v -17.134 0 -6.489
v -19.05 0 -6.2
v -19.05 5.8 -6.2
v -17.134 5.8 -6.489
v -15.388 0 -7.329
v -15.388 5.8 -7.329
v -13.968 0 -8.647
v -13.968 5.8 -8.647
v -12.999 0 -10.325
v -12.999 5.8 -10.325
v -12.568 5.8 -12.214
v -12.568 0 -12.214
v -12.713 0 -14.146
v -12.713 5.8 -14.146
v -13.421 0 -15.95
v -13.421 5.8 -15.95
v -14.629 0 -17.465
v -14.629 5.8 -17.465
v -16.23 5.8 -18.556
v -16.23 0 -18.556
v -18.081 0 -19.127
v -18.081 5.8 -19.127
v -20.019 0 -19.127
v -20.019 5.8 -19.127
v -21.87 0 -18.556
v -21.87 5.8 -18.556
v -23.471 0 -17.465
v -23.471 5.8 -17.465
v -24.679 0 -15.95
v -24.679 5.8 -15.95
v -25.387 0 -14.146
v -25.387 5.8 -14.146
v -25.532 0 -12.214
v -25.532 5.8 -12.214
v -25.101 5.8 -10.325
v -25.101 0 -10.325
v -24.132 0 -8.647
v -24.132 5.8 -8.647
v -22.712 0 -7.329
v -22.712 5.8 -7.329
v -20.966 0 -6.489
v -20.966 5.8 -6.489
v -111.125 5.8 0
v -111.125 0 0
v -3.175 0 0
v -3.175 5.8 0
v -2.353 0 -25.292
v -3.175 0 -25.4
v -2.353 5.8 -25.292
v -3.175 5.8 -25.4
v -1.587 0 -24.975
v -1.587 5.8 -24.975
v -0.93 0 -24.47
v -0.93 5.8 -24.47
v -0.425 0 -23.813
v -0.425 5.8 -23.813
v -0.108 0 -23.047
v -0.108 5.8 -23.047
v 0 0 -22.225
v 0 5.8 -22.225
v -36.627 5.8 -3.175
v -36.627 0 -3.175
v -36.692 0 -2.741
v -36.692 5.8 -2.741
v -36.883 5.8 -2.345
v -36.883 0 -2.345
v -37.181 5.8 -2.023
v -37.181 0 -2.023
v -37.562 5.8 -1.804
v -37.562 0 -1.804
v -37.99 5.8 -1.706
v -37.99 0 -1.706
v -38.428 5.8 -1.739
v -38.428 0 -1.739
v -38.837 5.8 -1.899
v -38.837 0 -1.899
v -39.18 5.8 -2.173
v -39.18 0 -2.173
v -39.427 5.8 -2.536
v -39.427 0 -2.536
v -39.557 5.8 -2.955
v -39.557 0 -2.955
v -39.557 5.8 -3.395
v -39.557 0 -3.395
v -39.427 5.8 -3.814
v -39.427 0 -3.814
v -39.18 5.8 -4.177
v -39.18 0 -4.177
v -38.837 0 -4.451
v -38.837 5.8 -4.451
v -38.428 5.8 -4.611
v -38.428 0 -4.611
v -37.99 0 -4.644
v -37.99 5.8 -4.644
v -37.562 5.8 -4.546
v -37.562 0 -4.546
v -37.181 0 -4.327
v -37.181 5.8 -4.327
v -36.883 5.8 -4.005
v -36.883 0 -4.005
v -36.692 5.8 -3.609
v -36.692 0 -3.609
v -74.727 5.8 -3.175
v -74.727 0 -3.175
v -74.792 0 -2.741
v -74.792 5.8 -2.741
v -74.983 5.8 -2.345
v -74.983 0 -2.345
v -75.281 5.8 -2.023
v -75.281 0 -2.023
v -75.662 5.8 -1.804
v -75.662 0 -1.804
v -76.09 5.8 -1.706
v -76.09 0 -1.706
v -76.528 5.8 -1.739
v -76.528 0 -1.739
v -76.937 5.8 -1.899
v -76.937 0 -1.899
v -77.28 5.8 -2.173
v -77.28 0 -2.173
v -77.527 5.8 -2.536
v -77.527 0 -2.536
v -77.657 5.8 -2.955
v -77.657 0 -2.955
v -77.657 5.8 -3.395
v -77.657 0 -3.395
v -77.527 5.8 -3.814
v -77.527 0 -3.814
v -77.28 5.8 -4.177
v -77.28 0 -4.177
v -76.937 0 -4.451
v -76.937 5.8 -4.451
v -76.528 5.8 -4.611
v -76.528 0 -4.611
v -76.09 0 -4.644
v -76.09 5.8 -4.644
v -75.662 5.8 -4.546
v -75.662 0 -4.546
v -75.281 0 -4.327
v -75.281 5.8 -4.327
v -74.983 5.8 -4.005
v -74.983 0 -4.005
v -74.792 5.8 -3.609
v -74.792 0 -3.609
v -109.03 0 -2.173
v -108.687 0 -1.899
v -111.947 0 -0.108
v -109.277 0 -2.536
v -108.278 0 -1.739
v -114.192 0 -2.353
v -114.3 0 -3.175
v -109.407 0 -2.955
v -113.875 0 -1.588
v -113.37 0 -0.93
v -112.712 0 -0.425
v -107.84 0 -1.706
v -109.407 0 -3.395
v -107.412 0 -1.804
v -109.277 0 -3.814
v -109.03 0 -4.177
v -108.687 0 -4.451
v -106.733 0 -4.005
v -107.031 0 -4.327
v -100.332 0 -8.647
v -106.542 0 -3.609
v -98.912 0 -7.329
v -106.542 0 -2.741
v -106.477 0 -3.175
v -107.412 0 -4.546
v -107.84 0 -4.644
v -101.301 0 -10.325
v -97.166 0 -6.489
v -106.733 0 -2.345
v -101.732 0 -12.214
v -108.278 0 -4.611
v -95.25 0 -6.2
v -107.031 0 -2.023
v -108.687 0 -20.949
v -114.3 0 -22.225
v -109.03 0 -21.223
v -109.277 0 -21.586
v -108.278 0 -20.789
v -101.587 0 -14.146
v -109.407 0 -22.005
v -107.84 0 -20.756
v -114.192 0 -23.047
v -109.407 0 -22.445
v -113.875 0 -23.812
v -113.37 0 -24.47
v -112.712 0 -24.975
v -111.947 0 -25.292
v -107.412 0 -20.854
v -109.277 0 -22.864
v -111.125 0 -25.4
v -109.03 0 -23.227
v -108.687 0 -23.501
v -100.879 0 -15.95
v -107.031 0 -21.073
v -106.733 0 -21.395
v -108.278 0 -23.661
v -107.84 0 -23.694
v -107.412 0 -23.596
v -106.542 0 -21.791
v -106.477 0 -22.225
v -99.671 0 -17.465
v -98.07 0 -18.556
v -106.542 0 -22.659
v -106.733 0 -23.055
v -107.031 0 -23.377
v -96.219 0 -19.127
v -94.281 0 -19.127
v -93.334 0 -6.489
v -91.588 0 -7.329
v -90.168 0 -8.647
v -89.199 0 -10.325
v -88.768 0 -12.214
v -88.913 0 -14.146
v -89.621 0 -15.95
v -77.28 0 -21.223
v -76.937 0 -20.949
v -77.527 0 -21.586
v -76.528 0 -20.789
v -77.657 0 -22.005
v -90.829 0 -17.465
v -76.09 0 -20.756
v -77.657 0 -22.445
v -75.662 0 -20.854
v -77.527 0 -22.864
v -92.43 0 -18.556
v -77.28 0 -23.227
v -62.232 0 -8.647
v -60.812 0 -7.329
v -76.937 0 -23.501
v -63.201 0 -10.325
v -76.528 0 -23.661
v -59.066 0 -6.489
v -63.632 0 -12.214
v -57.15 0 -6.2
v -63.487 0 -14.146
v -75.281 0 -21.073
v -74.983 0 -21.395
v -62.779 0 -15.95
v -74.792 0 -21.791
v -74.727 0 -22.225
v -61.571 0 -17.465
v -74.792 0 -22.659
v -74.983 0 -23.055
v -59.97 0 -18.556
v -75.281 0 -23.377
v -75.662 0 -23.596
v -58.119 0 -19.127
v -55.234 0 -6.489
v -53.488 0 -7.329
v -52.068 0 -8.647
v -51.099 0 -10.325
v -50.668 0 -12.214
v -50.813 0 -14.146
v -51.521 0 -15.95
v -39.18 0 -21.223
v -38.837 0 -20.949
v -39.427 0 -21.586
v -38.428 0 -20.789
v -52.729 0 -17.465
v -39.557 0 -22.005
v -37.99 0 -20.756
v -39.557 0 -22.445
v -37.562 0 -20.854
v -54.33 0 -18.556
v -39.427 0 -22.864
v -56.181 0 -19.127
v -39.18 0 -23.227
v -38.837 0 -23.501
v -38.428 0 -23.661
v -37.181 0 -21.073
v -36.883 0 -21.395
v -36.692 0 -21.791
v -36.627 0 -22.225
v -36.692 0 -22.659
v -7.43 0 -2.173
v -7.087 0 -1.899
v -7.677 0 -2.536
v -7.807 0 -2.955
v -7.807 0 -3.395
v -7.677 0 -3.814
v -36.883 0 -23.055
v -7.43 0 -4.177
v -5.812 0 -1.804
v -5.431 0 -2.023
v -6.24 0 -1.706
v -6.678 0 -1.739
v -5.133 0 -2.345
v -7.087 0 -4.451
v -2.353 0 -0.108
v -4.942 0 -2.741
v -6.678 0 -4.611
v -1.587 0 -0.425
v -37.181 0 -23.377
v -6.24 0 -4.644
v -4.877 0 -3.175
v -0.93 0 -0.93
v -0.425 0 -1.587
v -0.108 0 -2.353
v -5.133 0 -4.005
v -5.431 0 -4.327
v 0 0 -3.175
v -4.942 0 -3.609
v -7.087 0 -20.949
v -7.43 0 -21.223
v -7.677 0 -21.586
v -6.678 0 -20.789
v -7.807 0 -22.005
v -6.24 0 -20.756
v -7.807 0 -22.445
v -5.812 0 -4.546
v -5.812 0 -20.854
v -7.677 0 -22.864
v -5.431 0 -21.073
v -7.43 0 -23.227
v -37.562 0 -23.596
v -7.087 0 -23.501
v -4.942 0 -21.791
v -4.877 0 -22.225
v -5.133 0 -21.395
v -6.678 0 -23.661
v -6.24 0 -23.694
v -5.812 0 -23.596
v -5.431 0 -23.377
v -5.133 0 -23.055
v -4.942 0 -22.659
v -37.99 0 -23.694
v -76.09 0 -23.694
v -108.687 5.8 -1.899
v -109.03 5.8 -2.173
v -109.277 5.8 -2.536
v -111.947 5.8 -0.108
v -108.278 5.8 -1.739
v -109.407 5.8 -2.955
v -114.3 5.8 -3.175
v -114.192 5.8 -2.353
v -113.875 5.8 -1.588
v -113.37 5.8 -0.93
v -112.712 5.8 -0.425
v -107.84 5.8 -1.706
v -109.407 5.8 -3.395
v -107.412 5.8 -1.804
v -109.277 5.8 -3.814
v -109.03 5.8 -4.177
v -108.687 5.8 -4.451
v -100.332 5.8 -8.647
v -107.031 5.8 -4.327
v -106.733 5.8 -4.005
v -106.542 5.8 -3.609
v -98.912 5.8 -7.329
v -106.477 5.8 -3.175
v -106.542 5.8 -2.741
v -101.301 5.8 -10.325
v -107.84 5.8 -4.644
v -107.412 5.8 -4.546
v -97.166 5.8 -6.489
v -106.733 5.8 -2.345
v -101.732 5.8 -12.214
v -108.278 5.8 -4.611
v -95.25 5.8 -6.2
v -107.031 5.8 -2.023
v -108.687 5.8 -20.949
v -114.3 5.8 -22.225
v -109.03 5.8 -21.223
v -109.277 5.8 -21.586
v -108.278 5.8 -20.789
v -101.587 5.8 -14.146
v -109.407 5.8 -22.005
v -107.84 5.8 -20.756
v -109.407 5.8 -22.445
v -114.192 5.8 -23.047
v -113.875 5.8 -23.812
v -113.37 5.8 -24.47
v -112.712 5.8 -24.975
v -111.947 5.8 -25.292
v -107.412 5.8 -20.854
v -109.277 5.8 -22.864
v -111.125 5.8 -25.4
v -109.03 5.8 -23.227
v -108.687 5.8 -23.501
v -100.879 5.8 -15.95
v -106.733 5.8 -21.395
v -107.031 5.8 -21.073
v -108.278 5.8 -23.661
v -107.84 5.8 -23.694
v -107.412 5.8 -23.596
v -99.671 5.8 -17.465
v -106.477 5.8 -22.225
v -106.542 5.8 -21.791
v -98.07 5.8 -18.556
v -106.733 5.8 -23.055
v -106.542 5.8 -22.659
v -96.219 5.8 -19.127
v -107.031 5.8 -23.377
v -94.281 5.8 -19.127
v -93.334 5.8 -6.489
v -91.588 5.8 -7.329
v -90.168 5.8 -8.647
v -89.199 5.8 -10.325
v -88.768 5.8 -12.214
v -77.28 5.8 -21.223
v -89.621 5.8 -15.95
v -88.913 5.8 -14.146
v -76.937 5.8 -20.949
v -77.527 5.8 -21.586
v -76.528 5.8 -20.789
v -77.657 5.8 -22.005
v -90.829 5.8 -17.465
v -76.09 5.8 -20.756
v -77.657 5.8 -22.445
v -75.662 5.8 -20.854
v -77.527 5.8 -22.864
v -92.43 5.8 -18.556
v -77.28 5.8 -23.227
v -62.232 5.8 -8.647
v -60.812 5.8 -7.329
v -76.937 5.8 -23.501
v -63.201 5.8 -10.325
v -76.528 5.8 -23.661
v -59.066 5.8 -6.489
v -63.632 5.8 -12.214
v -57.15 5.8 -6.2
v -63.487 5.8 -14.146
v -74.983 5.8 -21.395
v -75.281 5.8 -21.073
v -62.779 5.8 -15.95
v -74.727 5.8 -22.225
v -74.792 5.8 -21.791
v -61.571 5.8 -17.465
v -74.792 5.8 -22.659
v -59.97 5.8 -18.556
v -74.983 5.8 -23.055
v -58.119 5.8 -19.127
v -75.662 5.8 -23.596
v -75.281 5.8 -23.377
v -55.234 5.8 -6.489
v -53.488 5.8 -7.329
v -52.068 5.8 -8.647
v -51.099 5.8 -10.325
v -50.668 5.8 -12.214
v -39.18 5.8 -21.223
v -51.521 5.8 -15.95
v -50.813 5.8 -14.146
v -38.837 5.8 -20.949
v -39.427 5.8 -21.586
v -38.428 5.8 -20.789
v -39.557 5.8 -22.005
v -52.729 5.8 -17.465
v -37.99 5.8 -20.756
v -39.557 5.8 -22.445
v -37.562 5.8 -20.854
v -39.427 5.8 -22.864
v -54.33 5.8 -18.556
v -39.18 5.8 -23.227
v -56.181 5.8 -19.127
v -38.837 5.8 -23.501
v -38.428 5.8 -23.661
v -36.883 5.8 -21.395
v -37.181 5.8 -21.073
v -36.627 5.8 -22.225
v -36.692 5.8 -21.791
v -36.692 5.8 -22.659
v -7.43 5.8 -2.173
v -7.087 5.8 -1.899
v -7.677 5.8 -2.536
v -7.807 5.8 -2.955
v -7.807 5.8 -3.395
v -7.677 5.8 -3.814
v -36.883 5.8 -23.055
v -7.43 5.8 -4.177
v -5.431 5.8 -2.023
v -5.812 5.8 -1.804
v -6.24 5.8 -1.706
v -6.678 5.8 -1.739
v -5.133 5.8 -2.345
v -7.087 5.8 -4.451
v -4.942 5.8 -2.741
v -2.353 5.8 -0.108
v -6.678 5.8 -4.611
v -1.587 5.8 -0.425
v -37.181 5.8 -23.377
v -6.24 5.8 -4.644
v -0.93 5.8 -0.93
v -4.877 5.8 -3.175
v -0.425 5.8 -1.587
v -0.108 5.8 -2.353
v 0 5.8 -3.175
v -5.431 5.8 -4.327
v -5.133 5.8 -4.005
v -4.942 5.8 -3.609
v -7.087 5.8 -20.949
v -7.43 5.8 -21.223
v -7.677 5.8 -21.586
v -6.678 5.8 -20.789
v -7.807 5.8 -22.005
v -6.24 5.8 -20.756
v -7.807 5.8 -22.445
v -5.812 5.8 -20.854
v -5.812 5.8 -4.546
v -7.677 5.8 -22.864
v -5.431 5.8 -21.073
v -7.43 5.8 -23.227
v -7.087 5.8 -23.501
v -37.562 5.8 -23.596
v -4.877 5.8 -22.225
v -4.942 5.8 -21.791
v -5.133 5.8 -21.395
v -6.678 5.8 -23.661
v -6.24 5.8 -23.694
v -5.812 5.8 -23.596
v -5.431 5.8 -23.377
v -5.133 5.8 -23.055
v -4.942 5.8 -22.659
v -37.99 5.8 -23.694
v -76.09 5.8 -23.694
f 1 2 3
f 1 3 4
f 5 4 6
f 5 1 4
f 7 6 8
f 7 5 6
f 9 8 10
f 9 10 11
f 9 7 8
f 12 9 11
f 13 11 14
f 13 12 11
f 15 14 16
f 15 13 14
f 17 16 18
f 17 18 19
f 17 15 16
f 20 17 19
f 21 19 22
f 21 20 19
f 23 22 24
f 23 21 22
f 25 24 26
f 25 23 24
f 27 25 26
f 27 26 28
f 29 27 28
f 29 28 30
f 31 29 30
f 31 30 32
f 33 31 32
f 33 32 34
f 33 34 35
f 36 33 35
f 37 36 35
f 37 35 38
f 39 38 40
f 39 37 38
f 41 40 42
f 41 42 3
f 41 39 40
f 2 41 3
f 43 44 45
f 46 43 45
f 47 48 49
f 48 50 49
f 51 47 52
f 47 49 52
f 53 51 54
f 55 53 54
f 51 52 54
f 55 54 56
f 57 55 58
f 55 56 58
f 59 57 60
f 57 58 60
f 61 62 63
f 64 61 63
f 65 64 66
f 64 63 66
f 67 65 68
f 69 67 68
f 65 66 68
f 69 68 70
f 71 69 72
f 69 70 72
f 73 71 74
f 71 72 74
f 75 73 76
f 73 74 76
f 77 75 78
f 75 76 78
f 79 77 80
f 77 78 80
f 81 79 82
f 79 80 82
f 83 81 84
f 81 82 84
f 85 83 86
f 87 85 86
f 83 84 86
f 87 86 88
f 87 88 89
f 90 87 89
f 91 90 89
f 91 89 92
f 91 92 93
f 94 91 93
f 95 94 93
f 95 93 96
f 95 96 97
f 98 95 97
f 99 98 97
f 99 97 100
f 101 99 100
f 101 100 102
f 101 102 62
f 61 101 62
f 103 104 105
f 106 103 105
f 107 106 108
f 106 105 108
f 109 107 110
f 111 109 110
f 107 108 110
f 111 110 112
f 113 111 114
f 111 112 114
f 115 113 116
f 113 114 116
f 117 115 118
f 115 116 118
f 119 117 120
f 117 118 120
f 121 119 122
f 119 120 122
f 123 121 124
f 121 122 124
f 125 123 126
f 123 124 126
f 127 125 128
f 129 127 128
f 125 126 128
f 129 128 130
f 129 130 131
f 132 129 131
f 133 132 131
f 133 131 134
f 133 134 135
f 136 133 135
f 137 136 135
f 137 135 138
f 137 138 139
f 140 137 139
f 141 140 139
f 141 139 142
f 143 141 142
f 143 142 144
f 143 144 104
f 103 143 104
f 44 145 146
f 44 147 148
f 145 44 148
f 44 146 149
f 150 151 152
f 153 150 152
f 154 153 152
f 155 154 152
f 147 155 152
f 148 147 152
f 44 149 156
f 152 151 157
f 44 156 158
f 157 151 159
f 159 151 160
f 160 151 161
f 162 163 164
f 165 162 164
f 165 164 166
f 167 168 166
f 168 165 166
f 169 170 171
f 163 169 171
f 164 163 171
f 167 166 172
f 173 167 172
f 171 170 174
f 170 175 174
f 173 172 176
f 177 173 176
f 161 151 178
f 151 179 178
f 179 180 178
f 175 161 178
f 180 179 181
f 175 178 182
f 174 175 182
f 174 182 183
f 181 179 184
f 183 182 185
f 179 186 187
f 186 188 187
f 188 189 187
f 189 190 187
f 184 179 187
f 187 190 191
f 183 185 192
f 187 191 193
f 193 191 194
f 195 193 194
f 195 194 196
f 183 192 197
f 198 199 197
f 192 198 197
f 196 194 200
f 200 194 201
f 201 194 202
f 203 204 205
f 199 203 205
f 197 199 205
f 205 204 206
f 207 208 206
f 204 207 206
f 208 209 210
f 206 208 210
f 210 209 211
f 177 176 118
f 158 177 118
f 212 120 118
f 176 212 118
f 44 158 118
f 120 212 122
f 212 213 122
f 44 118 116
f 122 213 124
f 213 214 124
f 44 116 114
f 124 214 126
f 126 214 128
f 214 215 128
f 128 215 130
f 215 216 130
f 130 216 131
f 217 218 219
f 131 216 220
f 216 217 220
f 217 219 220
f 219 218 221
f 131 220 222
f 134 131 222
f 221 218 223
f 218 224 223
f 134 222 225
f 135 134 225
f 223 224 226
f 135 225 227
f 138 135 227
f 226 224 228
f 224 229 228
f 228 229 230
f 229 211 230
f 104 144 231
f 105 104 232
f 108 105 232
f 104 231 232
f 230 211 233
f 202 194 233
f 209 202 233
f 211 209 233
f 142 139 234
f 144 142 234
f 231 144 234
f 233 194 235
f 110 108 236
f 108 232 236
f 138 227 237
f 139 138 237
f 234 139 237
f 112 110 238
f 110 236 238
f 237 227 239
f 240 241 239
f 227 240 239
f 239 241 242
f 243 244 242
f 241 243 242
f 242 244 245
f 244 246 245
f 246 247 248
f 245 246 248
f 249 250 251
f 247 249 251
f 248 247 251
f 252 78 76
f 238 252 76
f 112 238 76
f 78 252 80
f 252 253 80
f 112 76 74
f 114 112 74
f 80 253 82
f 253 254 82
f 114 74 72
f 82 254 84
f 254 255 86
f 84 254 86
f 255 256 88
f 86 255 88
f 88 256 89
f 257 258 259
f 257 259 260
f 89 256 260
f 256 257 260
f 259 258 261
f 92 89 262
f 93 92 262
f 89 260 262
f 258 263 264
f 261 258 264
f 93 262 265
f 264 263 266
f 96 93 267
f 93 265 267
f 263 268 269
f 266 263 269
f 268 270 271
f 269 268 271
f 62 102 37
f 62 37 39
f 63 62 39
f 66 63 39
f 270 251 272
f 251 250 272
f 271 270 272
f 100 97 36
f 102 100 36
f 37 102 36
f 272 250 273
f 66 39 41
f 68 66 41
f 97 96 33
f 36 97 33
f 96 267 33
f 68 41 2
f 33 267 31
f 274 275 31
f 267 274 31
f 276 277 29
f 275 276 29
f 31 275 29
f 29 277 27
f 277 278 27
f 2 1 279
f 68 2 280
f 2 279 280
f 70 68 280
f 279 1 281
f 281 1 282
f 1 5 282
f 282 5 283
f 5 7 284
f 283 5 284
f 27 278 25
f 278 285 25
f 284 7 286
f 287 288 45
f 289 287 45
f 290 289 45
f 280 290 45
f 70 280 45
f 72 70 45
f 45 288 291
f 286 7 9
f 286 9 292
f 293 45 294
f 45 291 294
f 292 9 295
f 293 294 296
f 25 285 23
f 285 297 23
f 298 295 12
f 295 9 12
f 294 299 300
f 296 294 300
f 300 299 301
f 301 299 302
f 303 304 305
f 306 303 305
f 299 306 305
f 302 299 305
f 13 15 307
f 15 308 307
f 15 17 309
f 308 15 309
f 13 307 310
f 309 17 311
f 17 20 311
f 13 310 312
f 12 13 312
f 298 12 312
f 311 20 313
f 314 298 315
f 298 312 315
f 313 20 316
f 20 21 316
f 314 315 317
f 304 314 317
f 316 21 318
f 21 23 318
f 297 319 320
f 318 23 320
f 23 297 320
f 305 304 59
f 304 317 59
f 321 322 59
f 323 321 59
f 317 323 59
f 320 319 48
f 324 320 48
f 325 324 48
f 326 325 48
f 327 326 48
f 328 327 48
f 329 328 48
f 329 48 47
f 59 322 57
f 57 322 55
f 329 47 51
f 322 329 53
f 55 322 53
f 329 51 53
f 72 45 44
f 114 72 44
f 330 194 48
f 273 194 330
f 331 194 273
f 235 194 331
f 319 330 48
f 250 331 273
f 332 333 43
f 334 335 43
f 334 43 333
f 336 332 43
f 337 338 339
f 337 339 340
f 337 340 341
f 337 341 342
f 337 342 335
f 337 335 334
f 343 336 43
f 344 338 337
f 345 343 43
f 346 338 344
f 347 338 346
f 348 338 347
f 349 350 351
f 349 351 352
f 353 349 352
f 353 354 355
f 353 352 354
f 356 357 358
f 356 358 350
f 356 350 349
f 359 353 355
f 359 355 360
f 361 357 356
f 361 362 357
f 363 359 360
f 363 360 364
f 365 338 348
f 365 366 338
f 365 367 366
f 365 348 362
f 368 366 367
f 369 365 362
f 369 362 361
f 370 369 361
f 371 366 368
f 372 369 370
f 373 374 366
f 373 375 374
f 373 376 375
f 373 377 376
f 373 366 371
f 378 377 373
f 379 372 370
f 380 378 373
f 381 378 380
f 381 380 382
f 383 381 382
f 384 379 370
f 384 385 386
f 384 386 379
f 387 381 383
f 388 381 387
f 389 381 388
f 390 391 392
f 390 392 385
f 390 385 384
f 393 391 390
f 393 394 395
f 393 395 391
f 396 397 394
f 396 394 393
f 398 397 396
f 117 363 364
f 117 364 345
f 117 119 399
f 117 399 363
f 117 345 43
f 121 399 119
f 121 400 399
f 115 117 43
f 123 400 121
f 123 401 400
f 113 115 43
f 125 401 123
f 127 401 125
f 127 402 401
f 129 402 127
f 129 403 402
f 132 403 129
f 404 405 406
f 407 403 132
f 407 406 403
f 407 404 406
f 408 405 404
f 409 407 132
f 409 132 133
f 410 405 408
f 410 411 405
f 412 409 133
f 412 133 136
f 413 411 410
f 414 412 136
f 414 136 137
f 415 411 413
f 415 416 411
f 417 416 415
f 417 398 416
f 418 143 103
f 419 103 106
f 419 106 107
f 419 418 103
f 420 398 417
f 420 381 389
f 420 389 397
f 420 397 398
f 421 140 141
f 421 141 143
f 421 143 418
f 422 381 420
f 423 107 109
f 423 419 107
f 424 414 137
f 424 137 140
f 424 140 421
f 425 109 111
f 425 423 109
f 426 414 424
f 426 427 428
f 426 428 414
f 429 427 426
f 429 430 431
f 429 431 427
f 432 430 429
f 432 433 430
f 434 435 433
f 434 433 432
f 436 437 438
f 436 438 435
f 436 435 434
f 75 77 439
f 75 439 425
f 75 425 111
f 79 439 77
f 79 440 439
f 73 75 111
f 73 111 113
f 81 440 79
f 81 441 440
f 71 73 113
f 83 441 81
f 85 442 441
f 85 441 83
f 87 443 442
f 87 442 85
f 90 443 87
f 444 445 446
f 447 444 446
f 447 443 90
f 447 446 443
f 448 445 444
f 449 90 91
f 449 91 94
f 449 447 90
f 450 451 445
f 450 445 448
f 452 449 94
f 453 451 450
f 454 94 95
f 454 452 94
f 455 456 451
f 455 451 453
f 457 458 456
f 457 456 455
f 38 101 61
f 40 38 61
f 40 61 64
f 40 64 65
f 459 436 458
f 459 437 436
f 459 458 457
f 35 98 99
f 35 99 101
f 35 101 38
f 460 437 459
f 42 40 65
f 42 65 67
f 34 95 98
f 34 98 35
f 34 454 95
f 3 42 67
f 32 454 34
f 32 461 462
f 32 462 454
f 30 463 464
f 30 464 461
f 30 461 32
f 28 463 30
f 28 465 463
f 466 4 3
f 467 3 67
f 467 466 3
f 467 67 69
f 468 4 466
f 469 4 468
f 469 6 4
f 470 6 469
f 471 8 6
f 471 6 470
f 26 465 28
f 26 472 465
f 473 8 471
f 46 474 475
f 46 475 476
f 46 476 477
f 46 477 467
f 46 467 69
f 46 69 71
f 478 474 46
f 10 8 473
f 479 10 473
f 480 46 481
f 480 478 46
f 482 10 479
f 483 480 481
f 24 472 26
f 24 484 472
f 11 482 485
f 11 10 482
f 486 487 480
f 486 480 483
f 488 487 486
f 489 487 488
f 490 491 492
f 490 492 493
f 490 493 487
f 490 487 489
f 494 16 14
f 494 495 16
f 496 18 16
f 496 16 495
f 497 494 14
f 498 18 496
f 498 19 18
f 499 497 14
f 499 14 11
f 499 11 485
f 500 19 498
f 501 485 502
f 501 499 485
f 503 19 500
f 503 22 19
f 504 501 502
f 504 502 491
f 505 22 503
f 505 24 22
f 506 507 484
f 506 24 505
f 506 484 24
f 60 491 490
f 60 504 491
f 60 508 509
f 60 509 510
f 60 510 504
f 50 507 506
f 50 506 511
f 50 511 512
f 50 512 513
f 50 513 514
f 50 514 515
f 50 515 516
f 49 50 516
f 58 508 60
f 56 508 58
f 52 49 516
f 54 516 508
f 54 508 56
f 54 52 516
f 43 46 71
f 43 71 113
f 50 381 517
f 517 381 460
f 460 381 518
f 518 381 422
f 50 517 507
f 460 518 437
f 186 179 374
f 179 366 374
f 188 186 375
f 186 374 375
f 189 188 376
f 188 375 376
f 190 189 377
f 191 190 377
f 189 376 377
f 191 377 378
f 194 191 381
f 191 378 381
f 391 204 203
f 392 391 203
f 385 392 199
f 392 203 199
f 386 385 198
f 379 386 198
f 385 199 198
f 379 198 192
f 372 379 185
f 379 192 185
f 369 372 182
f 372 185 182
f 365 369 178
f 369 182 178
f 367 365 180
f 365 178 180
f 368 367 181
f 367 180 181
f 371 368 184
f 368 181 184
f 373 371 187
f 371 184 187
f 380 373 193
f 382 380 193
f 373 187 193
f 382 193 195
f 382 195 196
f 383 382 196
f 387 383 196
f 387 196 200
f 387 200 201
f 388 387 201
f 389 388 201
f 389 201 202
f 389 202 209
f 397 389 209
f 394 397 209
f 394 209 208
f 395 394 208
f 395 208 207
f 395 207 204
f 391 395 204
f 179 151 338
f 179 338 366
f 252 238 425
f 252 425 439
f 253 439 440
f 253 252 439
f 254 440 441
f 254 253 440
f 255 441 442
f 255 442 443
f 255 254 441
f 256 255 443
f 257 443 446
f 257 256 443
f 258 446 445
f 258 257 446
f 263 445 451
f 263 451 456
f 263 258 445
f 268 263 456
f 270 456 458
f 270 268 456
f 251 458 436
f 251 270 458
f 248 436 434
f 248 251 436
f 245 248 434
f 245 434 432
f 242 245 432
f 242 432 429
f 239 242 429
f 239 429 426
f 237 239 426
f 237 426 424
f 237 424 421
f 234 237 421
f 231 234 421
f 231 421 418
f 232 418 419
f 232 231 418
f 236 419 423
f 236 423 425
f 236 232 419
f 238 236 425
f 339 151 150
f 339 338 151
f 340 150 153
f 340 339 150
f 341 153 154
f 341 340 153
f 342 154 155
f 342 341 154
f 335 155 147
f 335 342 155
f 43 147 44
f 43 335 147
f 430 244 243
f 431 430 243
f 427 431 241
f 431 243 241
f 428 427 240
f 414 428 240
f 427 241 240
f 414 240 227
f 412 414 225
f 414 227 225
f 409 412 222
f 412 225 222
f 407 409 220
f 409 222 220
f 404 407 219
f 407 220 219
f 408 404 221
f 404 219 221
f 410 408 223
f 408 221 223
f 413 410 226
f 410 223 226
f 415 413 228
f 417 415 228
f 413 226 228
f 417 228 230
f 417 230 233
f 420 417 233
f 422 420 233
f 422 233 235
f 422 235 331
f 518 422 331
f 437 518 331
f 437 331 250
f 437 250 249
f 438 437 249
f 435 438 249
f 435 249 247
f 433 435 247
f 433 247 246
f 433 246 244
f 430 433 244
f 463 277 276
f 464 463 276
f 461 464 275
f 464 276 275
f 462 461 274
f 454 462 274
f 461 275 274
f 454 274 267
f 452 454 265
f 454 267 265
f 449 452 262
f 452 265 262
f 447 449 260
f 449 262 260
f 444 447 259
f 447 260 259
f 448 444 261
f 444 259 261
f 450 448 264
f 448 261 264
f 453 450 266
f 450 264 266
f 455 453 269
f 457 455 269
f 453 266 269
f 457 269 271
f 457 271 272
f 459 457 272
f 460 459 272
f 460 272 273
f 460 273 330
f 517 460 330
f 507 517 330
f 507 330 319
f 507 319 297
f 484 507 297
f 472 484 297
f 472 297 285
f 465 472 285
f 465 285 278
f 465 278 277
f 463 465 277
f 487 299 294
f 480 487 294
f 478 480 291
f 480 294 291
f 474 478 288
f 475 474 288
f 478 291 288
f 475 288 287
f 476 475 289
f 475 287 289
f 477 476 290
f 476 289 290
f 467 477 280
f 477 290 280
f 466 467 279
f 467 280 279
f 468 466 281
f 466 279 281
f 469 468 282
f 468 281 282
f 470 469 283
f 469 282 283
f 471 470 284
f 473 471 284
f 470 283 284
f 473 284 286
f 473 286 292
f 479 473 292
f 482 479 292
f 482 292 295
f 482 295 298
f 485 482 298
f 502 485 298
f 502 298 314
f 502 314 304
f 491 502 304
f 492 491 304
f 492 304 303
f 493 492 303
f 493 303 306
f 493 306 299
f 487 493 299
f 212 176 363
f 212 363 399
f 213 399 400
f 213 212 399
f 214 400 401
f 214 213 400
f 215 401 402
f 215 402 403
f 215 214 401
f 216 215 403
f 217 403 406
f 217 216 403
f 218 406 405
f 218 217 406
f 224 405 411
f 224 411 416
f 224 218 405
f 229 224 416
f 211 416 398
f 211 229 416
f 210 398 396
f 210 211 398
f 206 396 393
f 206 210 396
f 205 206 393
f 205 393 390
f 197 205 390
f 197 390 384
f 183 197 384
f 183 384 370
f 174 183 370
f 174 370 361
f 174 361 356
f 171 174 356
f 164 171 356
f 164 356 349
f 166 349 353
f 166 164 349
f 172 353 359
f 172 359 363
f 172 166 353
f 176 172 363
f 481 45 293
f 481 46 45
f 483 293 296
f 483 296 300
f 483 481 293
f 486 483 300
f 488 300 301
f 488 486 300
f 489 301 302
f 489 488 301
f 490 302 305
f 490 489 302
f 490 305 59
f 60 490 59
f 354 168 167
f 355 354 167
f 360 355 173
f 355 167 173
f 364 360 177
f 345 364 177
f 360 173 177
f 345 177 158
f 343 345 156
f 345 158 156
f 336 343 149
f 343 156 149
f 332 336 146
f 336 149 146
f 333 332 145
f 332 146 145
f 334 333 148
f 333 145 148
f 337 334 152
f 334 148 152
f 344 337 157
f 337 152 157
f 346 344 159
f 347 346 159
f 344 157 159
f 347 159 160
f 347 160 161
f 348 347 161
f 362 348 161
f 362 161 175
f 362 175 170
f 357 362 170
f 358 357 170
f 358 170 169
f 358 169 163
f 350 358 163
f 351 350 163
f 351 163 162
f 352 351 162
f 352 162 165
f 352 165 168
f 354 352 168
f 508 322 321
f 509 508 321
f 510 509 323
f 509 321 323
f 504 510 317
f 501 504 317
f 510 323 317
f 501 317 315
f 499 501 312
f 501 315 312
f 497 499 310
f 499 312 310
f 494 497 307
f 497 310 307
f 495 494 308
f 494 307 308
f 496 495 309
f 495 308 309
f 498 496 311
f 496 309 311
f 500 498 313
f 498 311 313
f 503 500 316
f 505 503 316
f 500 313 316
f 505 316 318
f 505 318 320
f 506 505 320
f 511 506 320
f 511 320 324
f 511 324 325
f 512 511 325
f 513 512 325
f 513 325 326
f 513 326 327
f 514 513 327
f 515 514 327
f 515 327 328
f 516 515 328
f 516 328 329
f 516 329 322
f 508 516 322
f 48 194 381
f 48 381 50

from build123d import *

# Parameters (mm, degrees)
SKETCH1_W             = 114.3
SKETCH1_H             = 25.4
SKETCH1_R             = 6.5
BOSS_EXTRUDE1_DEPTH   = 5.8
F_4_CLEARANCE_HOLE1_D = 2.9464
FILLET1_R             = 3.175


with BuildPart() as part:
    # Sketch1 → Boss-Extrude1 (new body)
    with BuildSketch(Plane(origin=(0, 0, 0), x_dir=(1, 0, 0), z_dir=(0, 1, 0))):
        with Locations((-57.15, 12.7)):
            Rectangle(SKETCH1_W, SKETCH1_H)
        with Locations(Location((-95.25, 12.7, 0), (0, 0, 270))):
            Circle(SKETCH1_R, mode=Mode.SUBTRACT)
        with Locations(Location((-57.15, 12.7, 0), (0, 0, 270))):
            Circle(SKETCH1_R, mode=Mode.SUBTRACT)
        with Locations(Location((-19.05, 12.7, 0), (0, 0, 270))):
            Circle(SKETCH1_R, mode=Mode.SUBTRACT)
    extrude(amount=BOSS_EXTRUDE1_DEPTH)

    # #4 Clearance Hole1 (through all)
    with Locations(Plane(origin=(0, 5.8, 0), x_dir=(-1, 0, 0), z_dir=(0, 1, 0))):
        with Locations((107.95, -22.225), (107.95, -3.175), (76.2, -22.225), (76.2, -3.175), (6.35, -22.225), (38.1, -22.225), (38.1, -3.175), (6.35, -3.175)):
            Hole(F_4_CLEARANCE_HOLE1_D / 2)

    # Fillet1
    fillet1_edges = [part.edges().sort_by_distance(p)[0] for p in [
        (0, 2.9, 0),
        (-114.3, 2.9, 0),
        (-114.3, 2.9, -25.4),
        (0, 2.9, -25.4),
    ]]
    fillet(fillet1_edges, radius=FILLET1_R)


solid = part.part
